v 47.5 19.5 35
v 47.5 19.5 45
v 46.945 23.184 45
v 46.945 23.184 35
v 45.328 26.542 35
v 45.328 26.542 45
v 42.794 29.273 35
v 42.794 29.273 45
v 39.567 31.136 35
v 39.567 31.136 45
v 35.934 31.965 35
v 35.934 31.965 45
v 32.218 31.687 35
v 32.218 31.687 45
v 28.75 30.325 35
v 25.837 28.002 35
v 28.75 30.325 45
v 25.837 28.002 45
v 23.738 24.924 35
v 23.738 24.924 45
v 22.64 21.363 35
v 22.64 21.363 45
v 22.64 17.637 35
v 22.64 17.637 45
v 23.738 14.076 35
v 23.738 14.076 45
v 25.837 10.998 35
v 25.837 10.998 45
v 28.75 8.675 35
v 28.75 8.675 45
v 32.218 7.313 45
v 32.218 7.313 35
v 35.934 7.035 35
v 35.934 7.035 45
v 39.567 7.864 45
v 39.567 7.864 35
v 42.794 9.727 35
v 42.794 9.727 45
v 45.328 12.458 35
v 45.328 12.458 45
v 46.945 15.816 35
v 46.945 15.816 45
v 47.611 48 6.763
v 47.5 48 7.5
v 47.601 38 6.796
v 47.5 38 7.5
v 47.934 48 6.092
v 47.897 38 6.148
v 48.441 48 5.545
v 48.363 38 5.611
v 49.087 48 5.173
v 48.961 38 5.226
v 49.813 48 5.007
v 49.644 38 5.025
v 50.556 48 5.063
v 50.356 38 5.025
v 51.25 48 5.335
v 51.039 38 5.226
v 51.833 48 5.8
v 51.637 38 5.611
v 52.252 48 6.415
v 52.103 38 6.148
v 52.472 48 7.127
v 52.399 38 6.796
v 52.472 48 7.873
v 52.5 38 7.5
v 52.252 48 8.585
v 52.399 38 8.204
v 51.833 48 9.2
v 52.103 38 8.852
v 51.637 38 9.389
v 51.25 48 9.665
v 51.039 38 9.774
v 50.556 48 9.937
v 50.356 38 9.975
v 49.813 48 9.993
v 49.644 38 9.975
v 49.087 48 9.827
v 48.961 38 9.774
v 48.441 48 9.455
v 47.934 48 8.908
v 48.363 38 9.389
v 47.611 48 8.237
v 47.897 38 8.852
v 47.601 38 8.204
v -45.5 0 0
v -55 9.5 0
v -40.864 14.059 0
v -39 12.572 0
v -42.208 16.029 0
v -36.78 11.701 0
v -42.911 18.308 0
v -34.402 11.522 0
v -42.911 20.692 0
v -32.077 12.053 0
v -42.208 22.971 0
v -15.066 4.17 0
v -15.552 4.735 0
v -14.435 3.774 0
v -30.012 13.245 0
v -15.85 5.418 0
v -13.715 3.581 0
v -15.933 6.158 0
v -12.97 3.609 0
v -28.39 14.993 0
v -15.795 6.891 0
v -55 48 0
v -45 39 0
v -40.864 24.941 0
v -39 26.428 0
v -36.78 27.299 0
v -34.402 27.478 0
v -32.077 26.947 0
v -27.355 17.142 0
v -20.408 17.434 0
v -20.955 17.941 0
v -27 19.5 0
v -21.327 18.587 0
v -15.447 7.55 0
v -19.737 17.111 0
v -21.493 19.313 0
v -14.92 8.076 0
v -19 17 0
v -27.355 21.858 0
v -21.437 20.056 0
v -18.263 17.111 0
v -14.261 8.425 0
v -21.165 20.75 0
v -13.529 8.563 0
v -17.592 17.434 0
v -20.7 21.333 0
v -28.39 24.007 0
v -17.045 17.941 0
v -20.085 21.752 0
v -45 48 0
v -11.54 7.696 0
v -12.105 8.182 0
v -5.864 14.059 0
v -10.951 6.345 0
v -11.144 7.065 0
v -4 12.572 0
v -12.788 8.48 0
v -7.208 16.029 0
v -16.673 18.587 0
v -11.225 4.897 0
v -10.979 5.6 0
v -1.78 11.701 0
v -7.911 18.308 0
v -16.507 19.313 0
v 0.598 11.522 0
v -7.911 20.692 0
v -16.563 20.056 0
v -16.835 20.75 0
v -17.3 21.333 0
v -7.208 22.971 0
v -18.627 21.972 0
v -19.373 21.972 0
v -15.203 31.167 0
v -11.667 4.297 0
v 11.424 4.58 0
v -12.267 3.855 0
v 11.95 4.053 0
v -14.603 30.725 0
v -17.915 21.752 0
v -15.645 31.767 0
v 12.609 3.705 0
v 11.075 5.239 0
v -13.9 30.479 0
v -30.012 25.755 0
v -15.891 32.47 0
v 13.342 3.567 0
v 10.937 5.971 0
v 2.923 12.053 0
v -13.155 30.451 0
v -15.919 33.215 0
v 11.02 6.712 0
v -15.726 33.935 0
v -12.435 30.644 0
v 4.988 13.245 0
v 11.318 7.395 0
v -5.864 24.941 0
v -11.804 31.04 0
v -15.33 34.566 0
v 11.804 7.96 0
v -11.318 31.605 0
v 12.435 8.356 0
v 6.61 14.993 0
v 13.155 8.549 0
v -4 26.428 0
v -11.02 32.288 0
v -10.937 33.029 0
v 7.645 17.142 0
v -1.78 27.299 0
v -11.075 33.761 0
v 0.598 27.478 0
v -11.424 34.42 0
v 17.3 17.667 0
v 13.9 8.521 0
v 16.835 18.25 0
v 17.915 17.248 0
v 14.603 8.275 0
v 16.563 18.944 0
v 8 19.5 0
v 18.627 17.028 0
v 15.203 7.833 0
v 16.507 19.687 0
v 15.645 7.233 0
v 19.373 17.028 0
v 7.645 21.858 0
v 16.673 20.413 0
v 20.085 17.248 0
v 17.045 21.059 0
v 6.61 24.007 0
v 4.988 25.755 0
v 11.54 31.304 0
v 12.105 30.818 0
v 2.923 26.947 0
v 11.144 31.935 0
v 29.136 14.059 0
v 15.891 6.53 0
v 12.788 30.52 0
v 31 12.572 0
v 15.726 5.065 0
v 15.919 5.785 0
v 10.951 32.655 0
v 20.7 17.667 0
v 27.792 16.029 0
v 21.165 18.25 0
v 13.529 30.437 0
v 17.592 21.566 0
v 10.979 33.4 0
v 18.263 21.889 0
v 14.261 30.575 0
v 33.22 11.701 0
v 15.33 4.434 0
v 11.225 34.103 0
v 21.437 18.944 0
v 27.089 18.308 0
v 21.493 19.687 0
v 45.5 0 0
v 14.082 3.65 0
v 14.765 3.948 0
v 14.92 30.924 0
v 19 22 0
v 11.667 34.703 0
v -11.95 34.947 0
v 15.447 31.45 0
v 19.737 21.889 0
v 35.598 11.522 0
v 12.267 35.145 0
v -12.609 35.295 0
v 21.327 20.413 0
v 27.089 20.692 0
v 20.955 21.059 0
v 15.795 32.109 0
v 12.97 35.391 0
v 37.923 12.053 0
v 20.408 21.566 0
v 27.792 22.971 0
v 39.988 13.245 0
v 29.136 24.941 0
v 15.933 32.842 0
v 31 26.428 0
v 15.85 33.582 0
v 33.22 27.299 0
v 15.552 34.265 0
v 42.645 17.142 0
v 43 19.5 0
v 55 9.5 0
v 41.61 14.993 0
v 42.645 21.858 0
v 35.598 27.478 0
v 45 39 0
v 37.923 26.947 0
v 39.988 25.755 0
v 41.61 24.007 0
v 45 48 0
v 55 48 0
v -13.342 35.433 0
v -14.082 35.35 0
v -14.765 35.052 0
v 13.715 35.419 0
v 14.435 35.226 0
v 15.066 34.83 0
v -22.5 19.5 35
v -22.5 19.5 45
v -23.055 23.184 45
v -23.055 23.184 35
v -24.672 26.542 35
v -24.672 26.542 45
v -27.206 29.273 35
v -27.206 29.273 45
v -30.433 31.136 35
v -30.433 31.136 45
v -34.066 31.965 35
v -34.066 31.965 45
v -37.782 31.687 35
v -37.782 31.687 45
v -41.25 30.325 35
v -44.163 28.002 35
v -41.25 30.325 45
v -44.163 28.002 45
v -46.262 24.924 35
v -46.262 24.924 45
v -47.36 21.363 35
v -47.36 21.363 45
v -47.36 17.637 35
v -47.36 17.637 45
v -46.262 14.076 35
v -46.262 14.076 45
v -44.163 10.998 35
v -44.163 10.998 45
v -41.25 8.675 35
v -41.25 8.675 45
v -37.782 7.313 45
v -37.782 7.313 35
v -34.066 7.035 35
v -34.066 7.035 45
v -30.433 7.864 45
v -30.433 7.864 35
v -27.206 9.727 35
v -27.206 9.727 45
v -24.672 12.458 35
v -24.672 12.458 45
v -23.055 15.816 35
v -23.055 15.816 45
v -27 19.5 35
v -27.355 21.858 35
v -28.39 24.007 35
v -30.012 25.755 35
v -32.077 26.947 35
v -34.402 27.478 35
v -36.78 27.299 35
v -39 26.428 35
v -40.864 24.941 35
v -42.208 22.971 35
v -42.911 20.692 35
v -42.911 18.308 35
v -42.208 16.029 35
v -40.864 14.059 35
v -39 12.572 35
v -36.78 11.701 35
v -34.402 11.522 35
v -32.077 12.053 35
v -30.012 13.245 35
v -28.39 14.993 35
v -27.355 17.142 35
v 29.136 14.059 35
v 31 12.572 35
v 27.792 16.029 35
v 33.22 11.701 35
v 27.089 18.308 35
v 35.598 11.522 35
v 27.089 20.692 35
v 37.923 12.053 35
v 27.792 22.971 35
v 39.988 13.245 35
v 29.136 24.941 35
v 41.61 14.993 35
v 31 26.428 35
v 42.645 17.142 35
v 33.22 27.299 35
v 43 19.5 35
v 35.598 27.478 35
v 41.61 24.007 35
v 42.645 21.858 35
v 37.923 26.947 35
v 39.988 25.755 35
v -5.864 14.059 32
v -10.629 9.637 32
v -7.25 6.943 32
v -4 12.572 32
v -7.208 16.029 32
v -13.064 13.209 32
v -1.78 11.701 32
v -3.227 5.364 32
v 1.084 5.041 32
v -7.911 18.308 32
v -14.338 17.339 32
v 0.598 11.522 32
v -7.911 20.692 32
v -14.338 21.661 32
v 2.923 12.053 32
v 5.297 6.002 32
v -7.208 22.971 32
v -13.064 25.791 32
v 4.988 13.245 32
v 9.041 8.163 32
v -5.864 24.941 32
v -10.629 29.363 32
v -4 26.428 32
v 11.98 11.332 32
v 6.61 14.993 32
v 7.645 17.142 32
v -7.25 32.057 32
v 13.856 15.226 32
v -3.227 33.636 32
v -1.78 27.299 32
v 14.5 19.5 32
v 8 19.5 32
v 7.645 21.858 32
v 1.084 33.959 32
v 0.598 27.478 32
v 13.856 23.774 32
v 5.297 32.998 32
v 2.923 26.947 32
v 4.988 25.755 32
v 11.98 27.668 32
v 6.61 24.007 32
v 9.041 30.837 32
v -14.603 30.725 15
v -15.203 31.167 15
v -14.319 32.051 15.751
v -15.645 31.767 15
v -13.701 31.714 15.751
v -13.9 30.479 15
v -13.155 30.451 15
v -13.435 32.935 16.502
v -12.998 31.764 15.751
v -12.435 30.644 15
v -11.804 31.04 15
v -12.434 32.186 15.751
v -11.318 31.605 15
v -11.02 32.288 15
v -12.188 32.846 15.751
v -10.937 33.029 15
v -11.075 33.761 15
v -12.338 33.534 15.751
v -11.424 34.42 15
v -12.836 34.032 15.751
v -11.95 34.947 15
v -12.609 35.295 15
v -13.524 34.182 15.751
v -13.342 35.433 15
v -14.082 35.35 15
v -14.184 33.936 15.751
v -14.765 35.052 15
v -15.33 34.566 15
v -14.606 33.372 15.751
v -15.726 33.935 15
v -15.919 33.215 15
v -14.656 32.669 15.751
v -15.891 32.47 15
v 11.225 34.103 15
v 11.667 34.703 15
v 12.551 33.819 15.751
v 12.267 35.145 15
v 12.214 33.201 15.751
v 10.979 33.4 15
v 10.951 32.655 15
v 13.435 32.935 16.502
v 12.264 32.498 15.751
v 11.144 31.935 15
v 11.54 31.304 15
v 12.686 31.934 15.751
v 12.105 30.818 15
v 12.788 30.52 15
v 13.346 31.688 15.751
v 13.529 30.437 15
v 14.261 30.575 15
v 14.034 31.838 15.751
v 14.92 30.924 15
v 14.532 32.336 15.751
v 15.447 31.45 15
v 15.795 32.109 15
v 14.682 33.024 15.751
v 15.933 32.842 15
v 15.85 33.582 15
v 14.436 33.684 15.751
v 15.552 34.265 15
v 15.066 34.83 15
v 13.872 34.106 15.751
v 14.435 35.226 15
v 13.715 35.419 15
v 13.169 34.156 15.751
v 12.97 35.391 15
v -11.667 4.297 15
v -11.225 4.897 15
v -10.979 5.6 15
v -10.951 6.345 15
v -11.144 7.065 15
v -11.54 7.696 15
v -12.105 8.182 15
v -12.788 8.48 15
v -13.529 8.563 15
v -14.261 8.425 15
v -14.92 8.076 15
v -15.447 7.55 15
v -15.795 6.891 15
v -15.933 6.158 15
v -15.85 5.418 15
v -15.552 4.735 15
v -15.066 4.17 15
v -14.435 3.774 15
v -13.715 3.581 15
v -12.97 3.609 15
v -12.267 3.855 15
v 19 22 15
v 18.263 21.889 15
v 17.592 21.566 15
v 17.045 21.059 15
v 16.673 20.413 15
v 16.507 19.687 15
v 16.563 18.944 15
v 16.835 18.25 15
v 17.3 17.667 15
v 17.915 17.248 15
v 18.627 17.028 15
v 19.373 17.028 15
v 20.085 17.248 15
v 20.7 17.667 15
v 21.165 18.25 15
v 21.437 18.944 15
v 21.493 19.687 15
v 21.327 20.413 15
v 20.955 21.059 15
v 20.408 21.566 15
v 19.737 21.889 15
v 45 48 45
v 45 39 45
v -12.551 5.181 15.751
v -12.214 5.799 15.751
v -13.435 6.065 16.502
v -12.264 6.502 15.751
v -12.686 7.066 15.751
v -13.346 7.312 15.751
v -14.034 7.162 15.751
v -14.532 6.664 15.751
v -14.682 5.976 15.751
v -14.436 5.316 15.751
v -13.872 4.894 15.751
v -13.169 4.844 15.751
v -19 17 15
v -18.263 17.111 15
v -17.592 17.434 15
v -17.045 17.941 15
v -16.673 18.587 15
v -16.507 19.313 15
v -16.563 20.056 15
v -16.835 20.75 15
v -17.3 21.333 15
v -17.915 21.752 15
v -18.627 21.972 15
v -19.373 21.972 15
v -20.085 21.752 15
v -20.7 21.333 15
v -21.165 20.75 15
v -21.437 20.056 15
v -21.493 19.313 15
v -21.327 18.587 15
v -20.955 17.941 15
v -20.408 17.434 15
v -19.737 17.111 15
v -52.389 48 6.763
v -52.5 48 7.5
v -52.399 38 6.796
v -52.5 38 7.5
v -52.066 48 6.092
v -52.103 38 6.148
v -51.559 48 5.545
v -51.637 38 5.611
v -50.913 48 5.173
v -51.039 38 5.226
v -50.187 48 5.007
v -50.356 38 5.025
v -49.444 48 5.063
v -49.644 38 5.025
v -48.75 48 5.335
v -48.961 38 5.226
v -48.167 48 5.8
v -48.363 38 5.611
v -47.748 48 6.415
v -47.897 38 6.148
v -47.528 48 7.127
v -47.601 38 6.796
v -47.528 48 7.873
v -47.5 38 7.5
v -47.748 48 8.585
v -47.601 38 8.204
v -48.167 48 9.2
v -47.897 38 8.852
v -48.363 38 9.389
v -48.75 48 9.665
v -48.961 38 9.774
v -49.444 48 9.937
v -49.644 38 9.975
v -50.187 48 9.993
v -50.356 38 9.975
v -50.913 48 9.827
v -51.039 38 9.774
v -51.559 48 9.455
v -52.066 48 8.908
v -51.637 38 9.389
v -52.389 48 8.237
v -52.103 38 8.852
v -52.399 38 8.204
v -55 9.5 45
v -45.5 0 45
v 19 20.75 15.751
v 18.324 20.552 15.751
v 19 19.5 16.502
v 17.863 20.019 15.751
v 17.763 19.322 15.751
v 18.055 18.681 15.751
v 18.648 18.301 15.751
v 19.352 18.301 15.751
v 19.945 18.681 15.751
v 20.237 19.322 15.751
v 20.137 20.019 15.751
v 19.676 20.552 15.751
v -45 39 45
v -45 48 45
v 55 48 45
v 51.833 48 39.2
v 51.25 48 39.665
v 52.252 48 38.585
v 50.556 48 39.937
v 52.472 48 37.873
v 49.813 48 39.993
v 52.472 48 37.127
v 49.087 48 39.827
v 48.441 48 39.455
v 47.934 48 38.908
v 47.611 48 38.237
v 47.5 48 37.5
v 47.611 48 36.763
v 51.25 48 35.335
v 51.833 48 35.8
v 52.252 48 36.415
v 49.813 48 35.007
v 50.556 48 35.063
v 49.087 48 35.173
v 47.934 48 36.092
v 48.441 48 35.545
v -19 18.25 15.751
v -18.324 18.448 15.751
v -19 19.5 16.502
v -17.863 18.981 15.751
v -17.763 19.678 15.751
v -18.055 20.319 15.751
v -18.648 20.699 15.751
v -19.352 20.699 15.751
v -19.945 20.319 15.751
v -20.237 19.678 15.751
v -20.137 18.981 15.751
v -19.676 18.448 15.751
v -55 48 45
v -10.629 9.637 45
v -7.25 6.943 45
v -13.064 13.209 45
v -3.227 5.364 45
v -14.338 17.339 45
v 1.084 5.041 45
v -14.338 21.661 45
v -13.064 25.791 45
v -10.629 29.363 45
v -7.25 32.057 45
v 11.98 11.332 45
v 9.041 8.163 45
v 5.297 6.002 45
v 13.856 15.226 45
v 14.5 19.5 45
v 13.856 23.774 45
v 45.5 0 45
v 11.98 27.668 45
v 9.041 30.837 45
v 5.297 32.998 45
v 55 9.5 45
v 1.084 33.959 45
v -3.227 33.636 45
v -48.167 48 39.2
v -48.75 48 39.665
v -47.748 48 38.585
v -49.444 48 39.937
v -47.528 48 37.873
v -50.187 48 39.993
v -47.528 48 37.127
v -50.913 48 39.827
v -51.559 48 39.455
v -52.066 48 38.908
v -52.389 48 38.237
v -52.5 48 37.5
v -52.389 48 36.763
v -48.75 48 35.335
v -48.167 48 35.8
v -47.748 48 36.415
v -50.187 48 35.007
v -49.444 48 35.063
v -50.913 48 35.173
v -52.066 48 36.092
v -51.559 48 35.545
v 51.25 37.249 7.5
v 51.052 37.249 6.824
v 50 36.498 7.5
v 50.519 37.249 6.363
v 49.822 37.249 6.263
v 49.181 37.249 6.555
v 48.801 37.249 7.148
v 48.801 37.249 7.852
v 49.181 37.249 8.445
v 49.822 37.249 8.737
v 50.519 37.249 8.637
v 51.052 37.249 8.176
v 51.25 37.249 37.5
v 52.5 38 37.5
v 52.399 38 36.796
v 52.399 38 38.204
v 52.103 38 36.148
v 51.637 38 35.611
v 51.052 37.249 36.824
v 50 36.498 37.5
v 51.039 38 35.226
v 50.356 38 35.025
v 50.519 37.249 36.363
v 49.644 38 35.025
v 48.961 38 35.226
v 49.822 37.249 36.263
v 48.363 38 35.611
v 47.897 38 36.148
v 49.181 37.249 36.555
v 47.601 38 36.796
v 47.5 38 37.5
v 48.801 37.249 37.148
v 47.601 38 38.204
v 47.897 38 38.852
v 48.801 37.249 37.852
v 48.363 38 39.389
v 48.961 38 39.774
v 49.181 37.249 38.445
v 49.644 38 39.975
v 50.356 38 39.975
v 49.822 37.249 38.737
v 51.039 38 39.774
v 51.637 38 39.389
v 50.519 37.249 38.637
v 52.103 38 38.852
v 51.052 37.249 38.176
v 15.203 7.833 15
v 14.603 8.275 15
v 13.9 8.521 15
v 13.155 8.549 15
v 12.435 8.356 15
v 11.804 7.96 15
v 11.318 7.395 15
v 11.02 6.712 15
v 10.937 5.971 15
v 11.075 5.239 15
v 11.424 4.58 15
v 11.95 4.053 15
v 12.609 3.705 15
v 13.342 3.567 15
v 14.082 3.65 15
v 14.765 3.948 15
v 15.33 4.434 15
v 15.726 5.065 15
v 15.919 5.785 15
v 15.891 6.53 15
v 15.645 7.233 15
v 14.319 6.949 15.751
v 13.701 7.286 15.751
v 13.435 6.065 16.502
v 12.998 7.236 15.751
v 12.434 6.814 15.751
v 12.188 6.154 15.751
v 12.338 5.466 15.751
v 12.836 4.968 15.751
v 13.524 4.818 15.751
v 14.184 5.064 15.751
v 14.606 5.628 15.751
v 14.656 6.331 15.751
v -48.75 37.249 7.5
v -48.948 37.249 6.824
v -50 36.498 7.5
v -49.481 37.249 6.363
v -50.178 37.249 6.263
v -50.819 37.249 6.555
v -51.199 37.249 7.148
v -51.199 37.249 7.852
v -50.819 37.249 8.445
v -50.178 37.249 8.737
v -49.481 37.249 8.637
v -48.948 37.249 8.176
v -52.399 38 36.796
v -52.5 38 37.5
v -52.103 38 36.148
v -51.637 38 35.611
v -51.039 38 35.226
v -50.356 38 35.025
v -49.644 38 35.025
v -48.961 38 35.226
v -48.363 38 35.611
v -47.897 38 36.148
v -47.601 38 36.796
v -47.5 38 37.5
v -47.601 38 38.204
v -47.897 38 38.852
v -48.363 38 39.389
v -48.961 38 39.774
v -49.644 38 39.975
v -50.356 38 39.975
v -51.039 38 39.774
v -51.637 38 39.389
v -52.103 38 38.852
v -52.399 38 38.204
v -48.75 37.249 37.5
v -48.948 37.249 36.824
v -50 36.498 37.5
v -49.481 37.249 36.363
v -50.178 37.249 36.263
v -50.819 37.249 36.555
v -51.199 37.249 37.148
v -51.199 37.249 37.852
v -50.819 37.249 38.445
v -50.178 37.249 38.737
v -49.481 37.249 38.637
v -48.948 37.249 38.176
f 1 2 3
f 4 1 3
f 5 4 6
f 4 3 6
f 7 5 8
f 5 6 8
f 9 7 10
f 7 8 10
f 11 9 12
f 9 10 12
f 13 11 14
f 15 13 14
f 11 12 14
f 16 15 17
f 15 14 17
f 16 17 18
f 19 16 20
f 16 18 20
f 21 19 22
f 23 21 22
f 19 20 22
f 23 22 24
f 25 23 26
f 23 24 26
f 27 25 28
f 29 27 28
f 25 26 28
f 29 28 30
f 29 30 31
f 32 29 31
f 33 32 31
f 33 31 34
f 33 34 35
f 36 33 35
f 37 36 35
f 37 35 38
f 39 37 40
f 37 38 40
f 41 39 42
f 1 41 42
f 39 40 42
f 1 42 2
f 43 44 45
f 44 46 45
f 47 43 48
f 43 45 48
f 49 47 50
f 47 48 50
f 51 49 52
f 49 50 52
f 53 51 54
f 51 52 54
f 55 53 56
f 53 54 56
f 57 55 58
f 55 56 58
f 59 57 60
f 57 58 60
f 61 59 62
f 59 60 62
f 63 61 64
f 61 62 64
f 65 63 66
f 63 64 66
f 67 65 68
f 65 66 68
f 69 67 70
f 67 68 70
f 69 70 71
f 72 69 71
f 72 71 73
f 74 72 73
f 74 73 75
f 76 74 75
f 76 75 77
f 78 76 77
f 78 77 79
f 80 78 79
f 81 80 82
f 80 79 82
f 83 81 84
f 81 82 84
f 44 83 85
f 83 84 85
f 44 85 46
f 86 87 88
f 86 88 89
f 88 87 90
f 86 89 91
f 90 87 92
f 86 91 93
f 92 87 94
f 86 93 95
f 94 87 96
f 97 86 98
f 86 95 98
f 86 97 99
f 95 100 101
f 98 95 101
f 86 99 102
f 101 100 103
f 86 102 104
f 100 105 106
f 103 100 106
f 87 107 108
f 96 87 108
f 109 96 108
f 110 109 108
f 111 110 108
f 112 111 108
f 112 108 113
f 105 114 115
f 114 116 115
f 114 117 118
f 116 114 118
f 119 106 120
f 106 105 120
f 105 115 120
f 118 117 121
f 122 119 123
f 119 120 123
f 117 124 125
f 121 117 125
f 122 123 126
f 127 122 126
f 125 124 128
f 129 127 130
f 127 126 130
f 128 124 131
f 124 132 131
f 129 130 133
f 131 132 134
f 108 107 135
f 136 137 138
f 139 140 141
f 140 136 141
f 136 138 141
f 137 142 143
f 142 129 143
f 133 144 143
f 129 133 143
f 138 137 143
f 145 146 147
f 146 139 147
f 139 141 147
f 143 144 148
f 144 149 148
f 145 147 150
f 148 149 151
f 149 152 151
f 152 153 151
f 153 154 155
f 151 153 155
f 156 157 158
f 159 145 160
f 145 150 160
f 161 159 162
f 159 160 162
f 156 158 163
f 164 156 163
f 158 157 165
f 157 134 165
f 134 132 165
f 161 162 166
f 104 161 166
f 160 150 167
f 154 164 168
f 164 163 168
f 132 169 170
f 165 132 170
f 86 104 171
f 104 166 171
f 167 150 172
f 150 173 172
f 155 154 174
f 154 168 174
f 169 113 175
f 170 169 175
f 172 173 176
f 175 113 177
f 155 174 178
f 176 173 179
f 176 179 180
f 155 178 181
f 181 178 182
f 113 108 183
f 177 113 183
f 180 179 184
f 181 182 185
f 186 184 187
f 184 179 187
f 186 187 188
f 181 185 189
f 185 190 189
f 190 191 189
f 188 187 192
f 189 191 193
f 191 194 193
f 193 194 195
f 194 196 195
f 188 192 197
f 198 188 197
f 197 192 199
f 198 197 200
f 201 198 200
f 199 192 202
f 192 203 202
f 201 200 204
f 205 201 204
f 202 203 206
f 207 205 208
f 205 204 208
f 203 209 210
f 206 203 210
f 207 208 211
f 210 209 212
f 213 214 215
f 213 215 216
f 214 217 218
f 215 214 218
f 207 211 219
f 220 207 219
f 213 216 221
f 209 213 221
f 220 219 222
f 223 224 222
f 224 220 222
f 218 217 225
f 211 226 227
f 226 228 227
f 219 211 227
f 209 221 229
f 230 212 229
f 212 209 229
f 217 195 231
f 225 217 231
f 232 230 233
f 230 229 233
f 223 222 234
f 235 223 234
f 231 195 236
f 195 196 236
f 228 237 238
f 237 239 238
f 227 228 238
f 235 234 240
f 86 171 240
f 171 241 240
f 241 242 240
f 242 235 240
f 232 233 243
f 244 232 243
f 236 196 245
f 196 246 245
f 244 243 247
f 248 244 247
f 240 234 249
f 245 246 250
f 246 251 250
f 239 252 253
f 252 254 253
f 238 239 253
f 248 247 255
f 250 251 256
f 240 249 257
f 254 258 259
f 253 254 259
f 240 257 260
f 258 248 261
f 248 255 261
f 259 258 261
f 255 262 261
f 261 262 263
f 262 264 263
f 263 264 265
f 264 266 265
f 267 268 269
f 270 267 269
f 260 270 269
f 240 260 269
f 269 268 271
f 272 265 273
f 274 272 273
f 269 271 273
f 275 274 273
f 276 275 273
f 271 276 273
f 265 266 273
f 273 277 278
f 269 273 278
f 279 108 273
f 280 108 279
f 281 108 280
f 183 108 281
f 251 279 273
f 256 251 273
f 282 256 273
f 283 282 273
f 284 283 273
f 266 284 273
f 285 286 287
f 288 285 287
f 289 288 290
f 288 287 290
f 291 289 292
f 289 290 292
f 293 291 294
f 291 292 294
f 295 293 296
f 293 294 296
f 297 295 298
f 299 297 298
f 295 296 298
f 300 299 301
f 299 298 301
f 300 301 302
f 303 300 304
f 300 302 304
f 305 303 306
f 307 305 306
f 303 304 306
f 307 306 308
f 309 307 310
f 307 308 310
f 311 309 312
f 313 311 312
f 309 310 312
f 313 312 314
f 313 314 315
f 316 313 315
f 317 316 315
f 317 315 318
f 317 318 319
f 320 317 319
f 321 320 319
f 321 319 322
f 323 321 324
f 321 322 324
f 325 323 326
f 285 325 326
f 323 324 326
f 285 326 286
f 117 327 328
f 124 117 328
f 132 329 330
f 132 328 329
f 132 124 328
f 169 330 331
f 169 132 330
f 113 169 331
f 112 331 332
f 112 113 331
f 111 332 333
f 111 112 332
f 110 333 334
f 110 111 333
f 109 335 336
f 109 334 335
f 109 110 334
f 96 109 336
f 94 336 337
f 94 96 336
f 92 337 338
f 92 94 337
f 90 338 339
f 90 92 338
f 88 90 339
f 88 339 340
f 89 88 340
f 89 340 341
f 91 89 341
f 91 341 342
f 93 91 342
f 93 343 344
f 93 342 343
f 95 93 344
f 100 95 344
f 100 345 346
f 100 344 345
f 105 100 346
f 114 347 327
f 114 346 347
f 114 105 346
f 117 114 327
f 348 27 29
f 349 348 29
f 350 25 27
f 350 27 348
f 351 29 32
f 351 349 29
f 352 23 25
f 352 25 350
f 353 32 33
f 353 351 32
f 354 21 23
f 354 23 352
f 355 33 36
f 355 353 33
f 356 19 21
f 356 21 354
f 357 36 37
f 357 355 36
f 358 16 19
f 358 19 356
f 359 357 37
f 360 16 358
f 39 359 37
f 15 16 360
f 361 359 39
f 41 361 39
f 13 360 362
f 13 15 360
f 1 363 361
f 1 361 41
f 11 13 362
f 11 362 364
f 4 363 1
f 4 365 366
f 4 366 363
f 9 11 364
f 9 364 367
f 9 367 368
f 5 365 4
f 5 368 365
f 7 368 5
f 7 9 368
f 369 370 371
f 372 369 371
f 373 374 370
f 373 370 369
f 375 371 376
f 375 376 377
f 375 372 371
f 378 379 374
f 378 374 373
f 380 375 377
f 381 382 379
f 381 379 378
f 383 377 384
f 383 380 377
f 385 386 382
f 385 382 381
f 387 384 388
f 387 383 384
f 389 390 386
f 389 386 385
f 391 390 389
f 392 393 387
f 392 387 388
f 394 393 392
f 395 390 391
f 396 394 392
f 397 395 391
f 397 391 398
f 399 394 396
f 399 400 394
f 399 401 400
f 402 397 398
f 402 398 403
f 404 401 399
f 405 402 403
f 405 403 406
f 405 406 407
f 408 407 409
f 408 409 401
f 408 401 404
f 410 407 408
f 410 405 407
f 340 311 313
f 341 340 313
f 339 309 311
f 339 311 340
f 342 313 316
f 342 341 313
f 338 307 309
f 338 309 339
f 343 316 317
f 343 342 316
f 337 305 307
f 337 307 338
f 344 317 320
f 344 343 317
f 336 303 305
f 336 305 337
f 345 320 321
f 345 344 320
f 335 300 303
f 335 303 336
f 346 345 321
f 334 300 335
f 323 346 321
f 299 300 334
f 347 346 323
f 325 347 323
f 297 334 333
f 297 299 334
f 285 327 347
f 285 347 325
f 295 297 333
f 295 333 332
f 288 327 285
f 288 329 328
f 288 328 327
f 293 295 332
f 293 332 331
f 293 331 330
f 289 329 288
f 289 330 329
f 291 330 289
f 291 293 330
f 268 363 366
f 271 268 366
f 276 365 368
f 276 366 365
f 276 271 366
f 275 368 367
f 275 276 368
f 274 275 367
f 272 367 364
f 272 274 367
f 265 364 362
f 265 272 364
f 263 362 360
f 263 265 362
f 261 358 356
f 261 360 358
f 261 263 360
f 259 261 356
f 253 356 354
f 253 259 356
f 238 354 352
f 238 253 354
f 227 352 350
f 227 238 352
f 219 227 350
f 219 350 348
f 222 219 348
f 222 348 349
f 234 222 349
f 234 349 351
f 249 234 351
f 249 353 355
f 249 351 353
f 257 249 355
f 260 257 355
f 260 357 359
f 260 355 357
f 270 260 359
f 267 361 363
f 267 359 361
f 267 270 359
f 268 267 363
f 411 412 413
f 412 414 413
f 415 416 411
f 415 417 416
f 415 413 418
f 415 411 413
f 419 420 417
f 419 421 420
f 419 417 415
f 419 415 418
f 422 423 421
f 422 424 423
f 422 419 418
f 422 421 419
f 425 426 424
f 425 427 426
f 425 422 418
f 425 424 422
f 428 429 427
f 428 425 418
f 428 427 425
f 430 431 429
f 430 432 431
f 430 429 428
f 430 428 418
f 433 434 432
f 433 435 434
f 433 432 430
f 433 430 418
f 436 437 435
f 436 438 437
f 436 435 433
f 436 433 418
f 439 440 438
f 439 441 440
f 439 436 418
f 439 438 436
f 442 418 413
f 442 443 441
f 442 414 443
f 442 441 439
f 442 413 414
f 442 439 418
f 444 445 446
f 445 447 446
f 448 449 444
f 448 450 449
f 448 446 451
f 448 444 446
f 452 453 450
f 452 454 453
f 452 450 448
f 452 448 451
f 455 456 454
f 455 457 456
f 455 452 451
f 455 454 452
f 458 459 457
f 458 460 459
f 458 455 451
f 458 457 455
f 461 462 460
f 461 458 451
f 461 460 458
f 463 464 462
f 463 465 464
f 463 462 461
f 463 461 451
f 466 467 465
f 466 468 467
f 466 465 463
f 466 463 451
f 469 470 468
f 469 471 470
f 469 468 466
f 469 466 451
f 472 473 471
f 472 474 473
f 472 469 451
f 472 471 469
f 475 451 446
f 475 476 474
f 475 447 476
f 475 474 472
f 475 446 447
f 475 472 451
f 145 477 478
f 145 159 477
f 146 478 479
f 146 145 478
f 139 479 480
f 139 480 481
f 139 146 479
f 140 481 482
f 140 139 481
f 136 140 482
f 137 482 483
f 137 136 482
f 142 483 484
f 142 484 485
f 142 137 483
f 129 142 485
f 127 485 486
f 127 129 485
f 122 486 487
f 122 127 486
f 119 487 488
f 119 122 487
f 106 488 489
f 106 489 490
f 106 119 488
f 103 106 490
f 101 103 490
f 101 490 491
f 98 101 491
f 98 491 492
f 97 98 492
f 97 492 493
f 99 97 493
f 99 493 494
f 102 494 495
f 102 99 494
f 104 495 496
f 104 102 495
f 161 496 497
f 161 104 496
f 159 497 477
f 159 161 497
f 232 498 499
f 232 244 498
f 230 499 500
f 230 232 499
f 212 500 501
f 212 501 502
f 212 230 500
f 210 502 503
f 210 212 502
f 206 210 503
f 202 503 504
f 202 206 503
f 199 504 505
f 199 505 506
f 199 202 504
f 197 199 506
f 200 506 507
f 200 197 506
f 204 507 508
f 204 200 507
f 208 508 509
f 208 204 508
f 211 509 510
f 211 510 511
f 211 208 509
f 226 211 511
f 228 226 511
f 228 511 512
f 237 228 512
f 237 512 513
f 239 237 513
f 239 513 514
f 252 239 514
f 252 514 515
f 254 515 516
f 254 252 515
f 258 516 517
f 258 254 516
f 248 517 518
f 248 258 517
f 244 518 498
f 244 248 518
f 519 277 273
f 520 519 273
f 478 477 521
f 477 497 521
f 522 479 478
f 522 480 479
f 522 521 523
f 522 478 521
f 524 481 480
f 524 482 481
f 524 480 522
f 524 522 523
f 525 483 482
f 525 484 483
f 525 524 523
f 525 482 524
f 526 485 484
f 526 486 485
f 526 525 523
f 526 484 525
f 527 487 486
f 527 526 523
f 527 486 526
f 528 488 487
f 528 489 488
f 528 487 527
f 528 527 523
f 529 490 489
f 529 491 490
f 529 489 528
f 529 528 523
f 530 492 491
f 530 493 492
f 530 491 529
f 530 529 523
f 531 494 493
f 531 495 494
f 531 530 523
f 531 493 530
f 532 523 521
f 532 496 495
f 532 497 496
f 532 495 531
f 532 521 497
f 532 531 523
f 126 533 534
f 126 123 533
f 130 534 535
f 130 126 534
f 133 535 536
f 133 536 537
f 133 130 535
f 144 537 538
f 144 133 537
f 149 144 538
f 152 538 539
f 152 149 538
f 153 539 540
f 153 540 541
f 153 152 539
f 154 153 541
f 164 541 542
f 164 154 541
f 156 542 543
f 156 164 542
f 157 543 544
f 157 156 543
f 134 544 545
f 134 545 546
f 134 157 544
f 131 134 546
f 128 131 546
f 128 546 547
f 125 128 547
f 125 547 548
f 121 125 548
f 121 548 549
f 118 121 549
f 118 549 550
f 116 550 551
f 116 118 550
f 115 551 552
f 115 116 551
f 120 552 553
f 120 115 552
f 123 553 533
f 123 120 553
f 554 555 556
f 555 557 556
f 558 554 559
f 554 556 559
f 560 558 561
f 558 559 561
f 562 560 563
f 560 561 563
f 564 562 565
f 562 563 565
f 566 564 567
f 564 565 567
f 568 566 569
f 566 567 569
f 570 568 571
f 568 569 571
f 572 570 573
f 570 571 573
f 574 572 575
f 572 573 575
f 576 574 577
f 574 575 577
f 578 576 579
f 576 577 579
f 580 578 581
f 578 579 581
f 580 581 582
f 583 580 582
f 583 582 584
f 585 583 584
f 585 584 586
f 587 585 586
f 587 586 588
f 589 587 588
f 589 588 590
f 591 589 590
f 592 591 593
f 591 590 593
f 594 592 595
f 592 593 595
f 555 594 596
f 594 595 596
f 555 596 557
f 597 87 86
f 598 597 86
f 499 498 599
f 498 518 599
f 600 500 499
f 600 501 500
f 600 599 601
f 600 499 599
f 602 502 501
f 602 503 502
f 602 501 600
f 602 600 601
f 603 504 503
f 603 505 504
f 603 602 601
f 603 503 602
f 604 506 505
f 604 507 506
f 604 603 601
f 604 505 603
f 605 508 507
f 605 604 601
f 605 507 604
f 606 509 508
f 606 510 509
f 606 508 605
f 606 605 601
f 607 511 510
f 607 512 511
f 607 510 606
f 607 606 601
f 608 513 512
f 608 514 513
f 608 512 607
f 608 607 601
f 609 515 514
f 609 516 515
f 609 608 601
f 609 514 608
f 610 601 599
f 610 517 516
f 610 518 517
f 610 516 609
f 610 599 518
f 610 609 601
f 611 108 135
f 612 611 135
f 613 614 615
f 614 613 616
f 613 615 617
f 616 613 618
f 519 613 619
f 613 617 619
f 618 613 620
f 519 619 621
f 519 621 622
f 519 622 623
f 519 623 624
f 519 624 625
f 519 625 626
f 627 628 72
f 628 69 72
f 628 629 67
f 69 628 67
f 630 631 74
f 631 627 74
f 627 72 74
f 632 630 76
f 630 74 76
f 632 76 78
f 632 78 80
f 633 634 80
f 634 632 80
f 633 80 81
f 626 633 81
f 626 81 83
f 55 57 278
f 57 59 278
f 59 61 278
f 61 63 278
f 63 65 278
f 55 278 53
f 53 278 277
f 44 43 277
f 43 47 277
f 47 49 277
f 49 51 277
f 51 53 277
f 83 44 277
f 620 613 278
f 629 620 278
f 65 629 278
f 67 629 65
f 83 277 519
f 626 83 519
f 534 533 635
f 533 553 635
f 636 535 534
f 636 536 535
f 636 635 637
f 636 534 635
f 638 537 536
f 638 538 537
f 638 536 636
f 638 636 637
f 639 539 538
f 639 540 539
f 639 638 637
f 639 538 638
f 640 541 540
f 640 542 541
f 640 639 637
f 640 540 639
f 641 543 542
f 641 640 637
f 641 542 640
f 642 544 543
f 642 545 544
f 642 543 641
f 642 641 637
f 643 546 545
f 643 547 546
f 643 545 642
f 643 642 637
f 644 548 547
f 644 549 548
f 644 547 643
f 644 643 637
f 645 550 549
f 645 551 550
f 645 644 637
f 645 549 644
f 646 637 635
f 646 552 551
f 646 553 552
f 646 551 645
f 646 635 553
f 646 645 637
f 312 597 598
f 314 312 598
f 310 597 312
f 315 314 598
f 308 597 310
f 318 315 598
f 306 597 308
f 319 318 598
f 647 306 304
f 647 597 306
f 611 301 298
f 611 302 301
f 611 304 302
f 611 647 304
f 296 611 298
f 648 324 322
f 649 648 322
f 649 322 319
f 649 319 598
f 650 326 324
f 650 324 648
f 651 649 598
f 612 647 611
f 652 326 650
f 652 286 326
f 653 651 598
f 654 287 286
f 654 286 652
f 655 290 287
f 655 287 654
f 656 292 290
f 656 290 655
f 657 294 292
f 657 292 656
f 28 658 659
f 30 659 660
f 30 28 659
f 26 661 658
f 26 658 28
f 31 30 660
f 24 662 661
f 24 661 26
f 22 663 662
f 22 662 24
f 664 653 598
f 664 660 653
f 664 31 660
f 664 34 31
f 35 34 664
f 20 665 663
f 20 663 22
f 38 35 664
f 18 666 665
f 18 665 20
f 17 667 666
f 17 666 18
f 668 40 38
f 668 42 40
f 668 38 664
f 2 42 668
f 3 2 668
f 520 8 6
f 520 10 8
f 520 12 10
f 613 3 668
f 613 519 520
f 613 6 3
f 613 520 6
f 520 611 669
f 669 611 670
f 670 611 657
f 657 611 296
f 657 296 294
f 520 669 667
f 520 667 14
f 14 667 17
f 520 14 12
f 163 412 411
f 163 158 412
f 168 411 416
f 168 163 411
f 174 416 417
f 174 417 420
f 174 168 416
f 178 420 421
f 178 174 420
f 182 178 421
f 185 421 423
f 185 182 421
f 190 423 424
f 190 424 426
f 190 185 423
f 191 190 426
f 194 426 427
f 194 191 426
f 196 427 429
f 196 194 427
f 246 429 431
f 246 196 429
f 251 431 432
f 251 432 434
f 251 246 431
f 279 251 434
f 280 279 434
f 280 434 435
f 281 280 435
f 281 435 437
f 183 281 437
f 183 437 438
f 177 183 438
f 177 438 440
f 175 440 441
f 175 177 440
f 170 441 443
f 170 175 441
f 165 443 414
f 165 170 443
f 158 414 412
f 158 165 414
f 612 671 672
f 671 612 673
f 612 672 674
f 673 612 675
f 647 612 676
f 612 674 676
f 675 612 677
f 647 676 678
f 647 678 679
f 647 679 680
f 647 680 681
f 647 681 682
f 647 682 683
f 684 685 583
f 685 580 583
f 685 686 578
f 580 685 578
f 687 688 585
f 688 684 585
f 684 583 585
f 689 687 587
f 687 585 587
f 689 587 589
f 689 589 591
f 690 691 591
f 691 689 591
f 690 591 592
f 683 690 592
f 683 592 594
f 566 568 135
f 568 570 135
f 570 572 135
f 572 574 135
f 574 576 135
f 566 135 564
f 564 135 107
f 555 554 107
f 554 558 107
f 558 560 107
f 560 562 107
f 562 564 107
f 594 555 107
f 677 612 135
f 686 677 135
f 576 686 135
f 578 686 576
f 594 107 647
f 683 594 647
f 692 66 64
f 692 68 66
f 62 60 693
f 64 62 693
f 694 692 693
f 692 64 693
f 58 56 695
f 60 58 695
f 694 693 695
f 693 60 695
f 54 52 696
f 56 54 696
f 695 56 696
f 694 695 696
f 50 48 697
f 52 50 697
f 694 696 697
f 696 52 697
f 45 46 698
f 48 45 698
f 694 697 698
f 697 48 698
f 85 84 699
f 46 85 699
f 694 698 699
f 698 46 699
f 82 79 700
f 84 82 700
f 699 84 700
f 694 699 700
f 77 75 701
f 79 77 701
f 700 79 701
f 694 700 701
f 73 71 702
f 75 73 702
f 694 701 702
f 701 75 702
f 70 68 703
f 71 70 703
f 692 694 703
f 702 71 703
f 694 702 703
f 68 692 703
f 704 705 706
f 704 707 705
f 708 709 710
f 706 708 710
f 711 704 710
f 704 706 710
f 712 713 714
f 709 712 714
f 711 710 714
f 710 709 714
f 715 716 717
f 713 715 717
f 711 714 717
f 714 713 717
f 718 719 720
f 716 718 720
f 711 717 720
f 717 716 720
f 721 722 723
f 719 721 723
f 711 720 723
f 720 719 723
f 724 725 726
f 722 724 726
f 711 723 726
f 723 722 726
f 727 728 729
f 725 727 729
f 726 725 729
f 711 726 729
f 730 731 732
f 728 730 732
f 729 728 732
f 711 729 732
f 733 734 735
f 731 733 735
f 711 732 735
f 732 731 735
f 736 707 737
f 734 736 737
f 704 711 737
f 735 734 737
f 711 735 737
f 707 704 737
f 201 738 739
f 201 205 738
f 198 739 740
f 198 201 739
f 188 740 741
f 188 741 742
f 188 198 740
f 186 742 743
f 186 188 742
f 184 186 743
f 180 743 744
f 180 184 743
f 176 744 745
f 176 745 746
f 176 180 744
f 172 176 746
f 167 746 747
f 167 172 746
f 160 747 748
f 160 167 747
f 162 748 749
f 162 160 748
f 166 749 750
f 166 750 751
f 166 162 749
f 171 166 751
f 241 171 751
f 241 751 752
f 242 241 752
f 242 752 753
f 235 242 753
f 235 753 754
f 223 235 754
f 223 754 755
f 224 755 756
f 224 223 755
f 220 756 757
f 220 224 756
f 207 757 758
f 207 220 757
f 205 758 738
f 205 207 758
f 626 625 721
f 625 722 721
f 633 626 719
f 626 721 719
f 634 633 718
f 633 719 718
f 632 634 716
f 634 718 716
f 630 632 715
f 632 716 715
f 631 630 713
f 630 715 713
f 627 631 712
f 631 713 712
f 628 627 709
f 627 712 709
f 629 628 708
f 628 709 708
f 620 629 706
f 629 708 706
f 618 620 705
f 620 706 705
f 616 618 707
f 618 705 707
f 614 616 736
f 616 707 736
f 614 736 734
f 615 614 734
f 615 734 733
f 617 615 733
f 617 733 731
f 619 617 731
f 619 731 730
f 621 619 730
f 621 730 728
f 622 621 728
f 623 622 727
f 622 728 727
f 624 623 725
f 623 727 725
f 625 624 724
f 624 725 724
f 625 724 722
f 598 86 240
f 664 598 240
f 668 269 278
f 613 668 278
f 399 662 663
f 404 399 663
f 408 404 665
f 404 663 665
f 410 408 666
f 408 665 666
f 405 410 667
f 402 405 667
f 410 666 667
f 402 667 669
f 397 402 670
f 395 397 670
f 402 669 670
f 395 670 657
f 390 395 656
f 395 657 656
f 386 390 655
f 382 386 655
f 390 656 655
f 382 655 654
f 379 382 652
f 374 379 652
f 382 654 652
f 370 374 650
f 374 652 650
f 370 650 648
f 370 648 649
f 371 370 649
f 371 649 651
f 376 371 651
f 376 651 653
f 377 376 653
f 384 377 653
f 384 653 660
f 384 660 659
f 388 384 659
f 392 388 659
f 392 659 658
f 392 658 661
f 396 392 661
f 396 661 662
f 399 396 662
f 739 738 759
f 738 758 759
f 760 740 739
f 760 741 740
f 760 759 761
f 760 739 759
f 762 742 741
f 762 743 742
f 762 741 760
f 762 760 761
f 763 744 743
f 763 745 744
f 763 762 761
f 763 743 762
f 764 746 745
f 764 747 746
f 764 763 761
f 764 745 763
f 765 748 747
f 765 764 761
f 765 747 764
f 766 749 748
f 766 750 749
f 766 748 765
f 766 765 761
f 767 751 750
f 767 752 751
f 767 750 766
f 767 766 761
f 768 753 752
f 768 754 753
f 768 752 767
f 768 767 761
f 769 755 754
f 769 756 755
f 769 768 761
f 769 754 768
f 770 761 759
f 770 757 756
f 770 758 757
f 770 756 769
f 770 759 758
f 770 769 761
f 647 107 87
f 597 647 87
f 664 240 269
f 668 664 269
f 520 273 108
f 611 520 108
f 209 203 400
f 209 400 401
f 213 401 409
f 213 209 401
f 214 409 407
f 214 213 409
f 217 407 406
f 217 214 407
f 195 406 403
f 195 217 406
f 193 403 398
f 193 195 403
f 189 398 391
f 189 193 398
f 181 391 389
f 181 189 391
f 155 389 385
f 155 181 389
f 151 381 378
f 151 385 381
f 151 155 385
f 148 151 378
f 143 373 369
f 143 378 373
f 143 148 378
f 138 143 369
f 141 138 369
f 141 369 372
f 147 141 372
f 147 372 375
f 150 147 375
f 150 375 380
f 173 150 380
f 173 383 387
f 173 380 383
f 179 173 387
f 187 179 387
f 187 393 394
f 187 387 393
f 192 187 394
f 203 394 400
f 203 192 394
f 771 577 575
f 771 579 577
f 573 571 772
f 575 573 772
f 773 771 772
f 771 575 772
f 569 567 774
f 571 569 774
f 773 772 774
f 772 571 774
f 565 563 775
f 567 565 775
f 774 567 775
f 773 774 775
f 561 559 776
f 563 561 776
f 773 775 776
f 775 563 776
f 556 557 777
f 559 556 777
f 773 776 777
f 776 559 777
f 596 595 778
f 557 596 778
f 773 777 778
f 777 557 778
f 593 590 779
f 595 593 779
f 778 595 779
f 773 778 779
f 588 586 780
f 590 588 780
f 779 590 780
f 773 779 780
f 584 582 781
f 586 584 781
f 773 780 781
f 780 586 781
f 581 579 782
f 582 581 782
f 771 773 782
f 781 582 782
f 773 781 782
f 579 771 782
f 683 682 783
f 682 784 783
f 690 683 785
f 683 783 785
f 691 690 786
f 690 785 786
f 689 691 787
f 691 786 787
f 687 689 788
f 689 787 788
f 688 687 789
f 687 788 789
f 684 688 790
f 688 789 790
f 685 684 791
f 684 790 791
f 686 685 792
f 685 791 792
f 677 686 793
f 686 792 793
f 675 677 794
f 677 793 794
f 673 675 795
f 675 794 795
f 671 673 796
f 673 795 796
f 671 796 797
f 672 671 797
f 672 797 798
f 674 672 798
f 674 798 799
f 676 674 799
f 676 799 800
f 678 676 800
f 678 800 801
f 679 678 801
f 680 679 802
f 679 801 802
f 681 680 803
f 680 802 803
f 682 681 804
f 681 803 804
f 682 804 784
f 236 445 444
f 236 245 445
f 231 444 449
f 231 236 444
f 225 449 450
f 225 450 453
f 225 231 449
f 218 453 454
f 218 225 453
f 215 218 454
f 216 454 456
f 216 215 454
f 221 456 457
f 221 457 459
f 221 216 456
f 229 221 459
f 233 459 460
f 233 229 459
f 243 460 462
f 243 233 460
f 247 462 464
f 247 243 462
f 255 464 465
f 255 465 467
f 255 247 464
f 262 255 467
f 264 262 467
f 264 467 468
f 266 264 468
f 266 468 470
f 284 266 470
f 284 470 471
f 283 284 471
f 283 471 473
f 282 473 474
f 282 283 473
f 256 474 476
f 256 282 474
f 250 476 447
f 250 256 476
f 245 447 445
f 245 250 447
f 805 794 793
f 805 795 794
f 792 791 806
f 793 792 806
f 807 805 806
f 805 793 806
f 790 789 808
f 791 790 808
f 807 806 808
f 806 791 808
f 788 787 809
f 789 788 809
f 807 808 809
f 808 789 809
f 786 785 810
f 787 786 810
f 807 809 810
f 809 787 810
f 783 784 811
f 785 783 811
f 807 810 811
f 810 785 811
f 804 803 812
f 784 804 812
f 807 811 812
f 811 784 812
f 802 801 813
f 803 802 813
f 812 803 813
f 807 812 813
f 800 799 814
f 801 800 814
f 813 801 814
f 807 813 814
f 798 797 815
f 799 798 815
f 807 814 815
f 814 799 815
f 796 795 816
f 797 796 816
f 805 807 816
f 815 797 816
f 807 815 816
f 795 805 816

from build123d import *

# Parameters (mm, degrees)
BOSS_EXTRUDE1_DEPTH       = 45
M6X1_0_TAPPED_HOLE1_D     = 5
M6X1_0_TAPPED_HOLE1_DEPTH = 10
M6X1_0_TAPPED_HOLE1_TIP   = 1.502151548
SKETCH5_R                 = 12.5
SKETCH5_R_2               = 14.5
CUT_EXTRUDE1_DEPTH        = 10
SKETCH6_R                 = 14.5
CUT_EXTRUDE2_DEPTH        = 3
CUT_EXTRUDE3_DEPTH        = 86.755466298
CUT_EXTRUDE3_DEPTH_BACK   = 86.755466298
SKETCH7_R                 = 8
CIRPATTERN1_COUNT         = 8


with BuildPart() as part:
    # Sketch1 → Boss-Extrude1 (new body)
    with BuildSketch(Plane.XY):
        Polygon((-45.5, 0), (45.5, 0), (55, 9.5), (55, 48), (45, 48), (45, 39), (-45, 39), (-45, 48), (-55, 48), (-55, 9.5), align=None)
    extrude(amount=BOSS_EXTRUDE1_DEPTH)

    # M6x1.0 Tapped Hole1
    with Locations(Plane(origin=(0, 48, 0), x_dir=(1, 0, 0), z_dir=(0, 1, 0))):
        with Locations((-50, -7.5), (50, -7.5), (50, -37.5), (-50, -37.5)):
            Hole(M6X1_0_TAPPED_HOLE1_D / 2, depth=M6X1_0_TAPPED_HOLE1_DEPTH)
            with Locations((0, 0, -(M6X1_0_TAPPED_HOLE1_DEPTH + M6X1_0_TAPPED_HOLE1_TIP / 2))):  # 118° drill point
                Cone(0, M6X1_0_TAPPED_HOLE1_D / 2, M6X1_0_TAPPED_HOLE1_TIP, mode=Mode.SUBTRACT)

    # Sketch5 → Cut-Extrude1 (cut)
    with BuildSketch(Plane.XY.offset(45)):
        with Locations((-35, 19.5)):
            Circle(SKETCH5_R)
        with Locations((0, 19.5)):
            Circle(SKETCH5_R_2)
        with Locations((35, 19.5)):
            Circle(SKETCH5_R)
    extrude(amount=-CUT_EXTRUDE1_DEPTH, mode=Mode.SUBTRACT)

    # Sketch6 → Cut-Extrude2 (cut)
    with BuildSketch(Plane.XY.offset(35)):
        with Locations((0, 19.5)):
            Circle(SKETCH6_R)
    extrude(amount=-CUT_EXTRUDE2_DEPTH, mode=Mode.SUBTRACT)

    # Sketch7 → Cut-Extrude3 (cut, two sides: drawn at the far end of the back side and taken through both)
    with BuildSketch(Plane.XY.offset(-CUT_EXTRUDE3_DEPTH_BACK)):
        with Locations((0, 19.5)):
            Circle(SKETCH7_R)
        with Locations((35, 19.5)):
            Circle(SKETCH7_R)
        with Locations((-35, 19.5)):
            Circle(SKETCH7_R)
    extrude(amount=CUT_EXTRUDE3_DEPTH + CUT_EXTRUDE3_DEPTH_BACK, mode=Mode.SUBTRACT)

    # Sketch11 → M6x1.0 Tapped Hole2 (revolve, cut)
    with BuildSketch(Plane(origin=(19, 19.5, 0), x_dir=(0, 1, 0), z_dir=(1, 0, 0))):
        Polygon((0, 0), (0, 16.502151548), (2.5, 15), (2.5, 0), align=None)
    m6x1_0_tapped_hole2 = revolve(axis=Axis((19, 19.5, -6.35), (0, 0, 1)), mode=Mode.SUBTRACT)

    # CirPattern1: M6x1.0 Tapped Hole2 ×8 about axis, 2 skipped
    cirpattern1_axis = Axis((0, 19.5, 0), (0, 0, -1))
    add([m6x1_0_tapped_hole2.rotate(cirpattern1_axis, i * 360 / CIRPATTERN1_COUNT) for i in range(1, CIRPATTERN1_COUNT) if i not in (2, 6)], mode=Mode.SUBTRACT)


solid = part.part
